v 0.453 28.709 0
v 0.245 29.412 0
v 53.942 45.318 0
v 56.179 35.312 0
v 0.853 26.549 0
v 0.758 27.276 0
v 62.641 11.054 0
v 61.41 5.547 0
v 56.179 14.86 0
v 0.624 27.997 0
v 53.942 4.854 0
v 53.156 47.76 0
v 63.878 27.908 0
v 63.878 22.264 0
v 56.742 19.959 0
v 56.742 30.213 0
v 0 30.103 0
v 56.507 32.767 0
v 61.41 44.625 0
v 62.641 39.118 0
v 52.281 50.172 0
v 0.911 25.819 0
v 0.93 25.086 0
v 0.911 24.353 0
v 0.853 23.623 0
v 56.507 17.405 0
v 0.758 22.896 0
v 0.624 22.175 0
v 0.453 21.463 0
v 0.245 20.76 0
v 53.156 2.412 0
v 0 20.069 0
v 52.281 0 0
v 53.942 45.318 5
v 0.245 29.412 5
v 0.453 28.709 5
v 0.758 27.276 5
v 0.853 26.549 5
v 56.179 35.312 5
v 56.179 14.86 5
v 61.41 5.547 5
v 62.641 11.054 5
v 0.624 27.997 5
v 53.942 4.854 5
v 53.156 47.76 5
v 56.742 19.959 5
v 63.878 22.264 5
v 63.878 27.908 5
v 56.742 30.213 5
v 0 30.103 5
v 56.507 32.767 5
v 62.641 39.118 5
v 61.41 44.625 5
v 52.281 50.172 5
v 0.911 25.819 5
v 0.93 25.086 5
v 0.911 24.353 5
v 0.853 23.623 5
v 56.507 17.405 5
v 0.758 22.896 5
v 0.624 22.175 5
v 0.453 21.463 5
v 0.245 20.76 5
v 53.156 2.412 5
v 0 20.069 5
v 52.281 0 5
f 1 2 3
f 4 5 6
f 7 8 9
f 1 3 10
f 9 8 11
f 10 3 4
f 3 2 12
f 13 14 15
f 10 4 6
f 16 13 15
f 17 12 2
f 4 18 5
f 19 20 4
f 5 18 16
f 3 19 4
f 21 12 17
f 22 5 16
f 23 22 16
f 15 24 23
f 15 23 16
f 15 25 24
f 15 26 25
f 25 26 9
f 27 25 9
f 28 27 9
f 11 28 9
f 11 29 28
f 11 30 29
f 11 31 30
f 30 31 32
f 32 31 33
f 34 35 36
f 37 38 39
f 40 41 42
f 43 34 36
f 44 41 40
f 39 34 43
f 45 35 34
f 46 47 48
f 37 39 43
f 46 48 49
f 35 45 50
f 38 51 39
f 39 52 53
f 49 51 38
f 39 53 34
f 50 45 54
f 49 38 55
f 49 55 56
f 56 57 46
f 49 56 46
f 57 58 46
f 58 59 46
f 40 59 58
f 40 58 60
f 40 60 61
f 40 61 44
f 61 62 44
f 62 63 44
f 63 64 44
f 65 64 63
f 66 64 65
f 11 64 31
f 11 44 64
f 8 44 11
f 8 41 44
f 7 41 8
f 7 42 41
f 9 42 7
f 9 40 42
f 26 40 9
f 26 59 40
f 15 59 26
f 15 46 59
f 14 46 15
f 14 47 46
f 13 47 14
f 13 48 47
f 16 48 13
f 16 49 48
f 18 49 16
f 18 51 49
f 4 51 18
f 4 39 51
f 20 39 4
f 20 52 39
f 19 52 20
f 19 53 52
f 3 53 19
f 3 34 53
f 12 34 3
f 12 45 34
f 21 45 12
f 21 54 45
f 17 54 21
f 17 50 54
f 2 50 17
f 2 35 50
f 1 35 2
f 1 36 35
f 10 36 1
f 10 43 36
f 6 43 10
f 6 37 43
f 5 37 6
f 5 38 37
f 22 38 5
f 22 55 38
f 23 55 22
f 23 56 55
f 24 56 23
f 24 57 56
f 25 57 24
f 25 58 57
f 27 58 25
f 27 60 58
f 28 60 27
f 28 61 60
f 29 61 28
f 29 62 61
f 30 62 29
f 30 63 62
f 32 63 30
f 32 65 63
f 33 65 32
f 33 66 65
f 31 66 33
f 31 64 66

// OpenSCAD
$fn = 32;

// ----------------------------------------------------------------------
// Gear sector: 3 teeth on 42 degrees
// ----------------------------------------------------------------------

// --- parameters (mm) ---
sector_angle = 42;        // sector angle, degrees
root_r = 70;              // root circle radius
tooth_h = 7;              // tooth height over the root circle
teeth = 3;                // number of teeth on the sector
hub_r = 14;               // hub bore radius
plate_t = 5;              // sector thickness, Z
arc_step = 3;             // sampling step of the root/hub arcs, degrees

tip_r = root_r + tooth_h;  // tip circle radius

profile = [[52.281, 0], [53.156, 2.412], [53.942, 4.854], [61.41, 5.547], [62.641, 11.054], [56.179, 14.86], [56.507, 17.405], [56.742, 19.959], [63.878, 22.264], [63.878, 27.908], [56.742, 30.213], [56.507, 32.767], [56.179, 35.312], [62.641, 39.118], [61.41, 44.625], [53.942, 45.318], [53.156, 47.76], [52.281, 50.172], [0, 30.103], [0.245, 29.412], [0.453, 28.709], [0.624, 27.997], [0.758, 27.276], [0.853, 26.549], [0.911, 25.819], [0.93, 25.086], [0.911, 24.353], [0.853, 23.623], [0.758, 22.896], [0.624, 22.175], [0.453, 21.463], [0.245, 20.76], [0, 20.069]];  // primary outline, 33 points, counter clockwise

// --- the one profile operation ---
linear_extrude(height = plate_t) polygon(points = profile);
